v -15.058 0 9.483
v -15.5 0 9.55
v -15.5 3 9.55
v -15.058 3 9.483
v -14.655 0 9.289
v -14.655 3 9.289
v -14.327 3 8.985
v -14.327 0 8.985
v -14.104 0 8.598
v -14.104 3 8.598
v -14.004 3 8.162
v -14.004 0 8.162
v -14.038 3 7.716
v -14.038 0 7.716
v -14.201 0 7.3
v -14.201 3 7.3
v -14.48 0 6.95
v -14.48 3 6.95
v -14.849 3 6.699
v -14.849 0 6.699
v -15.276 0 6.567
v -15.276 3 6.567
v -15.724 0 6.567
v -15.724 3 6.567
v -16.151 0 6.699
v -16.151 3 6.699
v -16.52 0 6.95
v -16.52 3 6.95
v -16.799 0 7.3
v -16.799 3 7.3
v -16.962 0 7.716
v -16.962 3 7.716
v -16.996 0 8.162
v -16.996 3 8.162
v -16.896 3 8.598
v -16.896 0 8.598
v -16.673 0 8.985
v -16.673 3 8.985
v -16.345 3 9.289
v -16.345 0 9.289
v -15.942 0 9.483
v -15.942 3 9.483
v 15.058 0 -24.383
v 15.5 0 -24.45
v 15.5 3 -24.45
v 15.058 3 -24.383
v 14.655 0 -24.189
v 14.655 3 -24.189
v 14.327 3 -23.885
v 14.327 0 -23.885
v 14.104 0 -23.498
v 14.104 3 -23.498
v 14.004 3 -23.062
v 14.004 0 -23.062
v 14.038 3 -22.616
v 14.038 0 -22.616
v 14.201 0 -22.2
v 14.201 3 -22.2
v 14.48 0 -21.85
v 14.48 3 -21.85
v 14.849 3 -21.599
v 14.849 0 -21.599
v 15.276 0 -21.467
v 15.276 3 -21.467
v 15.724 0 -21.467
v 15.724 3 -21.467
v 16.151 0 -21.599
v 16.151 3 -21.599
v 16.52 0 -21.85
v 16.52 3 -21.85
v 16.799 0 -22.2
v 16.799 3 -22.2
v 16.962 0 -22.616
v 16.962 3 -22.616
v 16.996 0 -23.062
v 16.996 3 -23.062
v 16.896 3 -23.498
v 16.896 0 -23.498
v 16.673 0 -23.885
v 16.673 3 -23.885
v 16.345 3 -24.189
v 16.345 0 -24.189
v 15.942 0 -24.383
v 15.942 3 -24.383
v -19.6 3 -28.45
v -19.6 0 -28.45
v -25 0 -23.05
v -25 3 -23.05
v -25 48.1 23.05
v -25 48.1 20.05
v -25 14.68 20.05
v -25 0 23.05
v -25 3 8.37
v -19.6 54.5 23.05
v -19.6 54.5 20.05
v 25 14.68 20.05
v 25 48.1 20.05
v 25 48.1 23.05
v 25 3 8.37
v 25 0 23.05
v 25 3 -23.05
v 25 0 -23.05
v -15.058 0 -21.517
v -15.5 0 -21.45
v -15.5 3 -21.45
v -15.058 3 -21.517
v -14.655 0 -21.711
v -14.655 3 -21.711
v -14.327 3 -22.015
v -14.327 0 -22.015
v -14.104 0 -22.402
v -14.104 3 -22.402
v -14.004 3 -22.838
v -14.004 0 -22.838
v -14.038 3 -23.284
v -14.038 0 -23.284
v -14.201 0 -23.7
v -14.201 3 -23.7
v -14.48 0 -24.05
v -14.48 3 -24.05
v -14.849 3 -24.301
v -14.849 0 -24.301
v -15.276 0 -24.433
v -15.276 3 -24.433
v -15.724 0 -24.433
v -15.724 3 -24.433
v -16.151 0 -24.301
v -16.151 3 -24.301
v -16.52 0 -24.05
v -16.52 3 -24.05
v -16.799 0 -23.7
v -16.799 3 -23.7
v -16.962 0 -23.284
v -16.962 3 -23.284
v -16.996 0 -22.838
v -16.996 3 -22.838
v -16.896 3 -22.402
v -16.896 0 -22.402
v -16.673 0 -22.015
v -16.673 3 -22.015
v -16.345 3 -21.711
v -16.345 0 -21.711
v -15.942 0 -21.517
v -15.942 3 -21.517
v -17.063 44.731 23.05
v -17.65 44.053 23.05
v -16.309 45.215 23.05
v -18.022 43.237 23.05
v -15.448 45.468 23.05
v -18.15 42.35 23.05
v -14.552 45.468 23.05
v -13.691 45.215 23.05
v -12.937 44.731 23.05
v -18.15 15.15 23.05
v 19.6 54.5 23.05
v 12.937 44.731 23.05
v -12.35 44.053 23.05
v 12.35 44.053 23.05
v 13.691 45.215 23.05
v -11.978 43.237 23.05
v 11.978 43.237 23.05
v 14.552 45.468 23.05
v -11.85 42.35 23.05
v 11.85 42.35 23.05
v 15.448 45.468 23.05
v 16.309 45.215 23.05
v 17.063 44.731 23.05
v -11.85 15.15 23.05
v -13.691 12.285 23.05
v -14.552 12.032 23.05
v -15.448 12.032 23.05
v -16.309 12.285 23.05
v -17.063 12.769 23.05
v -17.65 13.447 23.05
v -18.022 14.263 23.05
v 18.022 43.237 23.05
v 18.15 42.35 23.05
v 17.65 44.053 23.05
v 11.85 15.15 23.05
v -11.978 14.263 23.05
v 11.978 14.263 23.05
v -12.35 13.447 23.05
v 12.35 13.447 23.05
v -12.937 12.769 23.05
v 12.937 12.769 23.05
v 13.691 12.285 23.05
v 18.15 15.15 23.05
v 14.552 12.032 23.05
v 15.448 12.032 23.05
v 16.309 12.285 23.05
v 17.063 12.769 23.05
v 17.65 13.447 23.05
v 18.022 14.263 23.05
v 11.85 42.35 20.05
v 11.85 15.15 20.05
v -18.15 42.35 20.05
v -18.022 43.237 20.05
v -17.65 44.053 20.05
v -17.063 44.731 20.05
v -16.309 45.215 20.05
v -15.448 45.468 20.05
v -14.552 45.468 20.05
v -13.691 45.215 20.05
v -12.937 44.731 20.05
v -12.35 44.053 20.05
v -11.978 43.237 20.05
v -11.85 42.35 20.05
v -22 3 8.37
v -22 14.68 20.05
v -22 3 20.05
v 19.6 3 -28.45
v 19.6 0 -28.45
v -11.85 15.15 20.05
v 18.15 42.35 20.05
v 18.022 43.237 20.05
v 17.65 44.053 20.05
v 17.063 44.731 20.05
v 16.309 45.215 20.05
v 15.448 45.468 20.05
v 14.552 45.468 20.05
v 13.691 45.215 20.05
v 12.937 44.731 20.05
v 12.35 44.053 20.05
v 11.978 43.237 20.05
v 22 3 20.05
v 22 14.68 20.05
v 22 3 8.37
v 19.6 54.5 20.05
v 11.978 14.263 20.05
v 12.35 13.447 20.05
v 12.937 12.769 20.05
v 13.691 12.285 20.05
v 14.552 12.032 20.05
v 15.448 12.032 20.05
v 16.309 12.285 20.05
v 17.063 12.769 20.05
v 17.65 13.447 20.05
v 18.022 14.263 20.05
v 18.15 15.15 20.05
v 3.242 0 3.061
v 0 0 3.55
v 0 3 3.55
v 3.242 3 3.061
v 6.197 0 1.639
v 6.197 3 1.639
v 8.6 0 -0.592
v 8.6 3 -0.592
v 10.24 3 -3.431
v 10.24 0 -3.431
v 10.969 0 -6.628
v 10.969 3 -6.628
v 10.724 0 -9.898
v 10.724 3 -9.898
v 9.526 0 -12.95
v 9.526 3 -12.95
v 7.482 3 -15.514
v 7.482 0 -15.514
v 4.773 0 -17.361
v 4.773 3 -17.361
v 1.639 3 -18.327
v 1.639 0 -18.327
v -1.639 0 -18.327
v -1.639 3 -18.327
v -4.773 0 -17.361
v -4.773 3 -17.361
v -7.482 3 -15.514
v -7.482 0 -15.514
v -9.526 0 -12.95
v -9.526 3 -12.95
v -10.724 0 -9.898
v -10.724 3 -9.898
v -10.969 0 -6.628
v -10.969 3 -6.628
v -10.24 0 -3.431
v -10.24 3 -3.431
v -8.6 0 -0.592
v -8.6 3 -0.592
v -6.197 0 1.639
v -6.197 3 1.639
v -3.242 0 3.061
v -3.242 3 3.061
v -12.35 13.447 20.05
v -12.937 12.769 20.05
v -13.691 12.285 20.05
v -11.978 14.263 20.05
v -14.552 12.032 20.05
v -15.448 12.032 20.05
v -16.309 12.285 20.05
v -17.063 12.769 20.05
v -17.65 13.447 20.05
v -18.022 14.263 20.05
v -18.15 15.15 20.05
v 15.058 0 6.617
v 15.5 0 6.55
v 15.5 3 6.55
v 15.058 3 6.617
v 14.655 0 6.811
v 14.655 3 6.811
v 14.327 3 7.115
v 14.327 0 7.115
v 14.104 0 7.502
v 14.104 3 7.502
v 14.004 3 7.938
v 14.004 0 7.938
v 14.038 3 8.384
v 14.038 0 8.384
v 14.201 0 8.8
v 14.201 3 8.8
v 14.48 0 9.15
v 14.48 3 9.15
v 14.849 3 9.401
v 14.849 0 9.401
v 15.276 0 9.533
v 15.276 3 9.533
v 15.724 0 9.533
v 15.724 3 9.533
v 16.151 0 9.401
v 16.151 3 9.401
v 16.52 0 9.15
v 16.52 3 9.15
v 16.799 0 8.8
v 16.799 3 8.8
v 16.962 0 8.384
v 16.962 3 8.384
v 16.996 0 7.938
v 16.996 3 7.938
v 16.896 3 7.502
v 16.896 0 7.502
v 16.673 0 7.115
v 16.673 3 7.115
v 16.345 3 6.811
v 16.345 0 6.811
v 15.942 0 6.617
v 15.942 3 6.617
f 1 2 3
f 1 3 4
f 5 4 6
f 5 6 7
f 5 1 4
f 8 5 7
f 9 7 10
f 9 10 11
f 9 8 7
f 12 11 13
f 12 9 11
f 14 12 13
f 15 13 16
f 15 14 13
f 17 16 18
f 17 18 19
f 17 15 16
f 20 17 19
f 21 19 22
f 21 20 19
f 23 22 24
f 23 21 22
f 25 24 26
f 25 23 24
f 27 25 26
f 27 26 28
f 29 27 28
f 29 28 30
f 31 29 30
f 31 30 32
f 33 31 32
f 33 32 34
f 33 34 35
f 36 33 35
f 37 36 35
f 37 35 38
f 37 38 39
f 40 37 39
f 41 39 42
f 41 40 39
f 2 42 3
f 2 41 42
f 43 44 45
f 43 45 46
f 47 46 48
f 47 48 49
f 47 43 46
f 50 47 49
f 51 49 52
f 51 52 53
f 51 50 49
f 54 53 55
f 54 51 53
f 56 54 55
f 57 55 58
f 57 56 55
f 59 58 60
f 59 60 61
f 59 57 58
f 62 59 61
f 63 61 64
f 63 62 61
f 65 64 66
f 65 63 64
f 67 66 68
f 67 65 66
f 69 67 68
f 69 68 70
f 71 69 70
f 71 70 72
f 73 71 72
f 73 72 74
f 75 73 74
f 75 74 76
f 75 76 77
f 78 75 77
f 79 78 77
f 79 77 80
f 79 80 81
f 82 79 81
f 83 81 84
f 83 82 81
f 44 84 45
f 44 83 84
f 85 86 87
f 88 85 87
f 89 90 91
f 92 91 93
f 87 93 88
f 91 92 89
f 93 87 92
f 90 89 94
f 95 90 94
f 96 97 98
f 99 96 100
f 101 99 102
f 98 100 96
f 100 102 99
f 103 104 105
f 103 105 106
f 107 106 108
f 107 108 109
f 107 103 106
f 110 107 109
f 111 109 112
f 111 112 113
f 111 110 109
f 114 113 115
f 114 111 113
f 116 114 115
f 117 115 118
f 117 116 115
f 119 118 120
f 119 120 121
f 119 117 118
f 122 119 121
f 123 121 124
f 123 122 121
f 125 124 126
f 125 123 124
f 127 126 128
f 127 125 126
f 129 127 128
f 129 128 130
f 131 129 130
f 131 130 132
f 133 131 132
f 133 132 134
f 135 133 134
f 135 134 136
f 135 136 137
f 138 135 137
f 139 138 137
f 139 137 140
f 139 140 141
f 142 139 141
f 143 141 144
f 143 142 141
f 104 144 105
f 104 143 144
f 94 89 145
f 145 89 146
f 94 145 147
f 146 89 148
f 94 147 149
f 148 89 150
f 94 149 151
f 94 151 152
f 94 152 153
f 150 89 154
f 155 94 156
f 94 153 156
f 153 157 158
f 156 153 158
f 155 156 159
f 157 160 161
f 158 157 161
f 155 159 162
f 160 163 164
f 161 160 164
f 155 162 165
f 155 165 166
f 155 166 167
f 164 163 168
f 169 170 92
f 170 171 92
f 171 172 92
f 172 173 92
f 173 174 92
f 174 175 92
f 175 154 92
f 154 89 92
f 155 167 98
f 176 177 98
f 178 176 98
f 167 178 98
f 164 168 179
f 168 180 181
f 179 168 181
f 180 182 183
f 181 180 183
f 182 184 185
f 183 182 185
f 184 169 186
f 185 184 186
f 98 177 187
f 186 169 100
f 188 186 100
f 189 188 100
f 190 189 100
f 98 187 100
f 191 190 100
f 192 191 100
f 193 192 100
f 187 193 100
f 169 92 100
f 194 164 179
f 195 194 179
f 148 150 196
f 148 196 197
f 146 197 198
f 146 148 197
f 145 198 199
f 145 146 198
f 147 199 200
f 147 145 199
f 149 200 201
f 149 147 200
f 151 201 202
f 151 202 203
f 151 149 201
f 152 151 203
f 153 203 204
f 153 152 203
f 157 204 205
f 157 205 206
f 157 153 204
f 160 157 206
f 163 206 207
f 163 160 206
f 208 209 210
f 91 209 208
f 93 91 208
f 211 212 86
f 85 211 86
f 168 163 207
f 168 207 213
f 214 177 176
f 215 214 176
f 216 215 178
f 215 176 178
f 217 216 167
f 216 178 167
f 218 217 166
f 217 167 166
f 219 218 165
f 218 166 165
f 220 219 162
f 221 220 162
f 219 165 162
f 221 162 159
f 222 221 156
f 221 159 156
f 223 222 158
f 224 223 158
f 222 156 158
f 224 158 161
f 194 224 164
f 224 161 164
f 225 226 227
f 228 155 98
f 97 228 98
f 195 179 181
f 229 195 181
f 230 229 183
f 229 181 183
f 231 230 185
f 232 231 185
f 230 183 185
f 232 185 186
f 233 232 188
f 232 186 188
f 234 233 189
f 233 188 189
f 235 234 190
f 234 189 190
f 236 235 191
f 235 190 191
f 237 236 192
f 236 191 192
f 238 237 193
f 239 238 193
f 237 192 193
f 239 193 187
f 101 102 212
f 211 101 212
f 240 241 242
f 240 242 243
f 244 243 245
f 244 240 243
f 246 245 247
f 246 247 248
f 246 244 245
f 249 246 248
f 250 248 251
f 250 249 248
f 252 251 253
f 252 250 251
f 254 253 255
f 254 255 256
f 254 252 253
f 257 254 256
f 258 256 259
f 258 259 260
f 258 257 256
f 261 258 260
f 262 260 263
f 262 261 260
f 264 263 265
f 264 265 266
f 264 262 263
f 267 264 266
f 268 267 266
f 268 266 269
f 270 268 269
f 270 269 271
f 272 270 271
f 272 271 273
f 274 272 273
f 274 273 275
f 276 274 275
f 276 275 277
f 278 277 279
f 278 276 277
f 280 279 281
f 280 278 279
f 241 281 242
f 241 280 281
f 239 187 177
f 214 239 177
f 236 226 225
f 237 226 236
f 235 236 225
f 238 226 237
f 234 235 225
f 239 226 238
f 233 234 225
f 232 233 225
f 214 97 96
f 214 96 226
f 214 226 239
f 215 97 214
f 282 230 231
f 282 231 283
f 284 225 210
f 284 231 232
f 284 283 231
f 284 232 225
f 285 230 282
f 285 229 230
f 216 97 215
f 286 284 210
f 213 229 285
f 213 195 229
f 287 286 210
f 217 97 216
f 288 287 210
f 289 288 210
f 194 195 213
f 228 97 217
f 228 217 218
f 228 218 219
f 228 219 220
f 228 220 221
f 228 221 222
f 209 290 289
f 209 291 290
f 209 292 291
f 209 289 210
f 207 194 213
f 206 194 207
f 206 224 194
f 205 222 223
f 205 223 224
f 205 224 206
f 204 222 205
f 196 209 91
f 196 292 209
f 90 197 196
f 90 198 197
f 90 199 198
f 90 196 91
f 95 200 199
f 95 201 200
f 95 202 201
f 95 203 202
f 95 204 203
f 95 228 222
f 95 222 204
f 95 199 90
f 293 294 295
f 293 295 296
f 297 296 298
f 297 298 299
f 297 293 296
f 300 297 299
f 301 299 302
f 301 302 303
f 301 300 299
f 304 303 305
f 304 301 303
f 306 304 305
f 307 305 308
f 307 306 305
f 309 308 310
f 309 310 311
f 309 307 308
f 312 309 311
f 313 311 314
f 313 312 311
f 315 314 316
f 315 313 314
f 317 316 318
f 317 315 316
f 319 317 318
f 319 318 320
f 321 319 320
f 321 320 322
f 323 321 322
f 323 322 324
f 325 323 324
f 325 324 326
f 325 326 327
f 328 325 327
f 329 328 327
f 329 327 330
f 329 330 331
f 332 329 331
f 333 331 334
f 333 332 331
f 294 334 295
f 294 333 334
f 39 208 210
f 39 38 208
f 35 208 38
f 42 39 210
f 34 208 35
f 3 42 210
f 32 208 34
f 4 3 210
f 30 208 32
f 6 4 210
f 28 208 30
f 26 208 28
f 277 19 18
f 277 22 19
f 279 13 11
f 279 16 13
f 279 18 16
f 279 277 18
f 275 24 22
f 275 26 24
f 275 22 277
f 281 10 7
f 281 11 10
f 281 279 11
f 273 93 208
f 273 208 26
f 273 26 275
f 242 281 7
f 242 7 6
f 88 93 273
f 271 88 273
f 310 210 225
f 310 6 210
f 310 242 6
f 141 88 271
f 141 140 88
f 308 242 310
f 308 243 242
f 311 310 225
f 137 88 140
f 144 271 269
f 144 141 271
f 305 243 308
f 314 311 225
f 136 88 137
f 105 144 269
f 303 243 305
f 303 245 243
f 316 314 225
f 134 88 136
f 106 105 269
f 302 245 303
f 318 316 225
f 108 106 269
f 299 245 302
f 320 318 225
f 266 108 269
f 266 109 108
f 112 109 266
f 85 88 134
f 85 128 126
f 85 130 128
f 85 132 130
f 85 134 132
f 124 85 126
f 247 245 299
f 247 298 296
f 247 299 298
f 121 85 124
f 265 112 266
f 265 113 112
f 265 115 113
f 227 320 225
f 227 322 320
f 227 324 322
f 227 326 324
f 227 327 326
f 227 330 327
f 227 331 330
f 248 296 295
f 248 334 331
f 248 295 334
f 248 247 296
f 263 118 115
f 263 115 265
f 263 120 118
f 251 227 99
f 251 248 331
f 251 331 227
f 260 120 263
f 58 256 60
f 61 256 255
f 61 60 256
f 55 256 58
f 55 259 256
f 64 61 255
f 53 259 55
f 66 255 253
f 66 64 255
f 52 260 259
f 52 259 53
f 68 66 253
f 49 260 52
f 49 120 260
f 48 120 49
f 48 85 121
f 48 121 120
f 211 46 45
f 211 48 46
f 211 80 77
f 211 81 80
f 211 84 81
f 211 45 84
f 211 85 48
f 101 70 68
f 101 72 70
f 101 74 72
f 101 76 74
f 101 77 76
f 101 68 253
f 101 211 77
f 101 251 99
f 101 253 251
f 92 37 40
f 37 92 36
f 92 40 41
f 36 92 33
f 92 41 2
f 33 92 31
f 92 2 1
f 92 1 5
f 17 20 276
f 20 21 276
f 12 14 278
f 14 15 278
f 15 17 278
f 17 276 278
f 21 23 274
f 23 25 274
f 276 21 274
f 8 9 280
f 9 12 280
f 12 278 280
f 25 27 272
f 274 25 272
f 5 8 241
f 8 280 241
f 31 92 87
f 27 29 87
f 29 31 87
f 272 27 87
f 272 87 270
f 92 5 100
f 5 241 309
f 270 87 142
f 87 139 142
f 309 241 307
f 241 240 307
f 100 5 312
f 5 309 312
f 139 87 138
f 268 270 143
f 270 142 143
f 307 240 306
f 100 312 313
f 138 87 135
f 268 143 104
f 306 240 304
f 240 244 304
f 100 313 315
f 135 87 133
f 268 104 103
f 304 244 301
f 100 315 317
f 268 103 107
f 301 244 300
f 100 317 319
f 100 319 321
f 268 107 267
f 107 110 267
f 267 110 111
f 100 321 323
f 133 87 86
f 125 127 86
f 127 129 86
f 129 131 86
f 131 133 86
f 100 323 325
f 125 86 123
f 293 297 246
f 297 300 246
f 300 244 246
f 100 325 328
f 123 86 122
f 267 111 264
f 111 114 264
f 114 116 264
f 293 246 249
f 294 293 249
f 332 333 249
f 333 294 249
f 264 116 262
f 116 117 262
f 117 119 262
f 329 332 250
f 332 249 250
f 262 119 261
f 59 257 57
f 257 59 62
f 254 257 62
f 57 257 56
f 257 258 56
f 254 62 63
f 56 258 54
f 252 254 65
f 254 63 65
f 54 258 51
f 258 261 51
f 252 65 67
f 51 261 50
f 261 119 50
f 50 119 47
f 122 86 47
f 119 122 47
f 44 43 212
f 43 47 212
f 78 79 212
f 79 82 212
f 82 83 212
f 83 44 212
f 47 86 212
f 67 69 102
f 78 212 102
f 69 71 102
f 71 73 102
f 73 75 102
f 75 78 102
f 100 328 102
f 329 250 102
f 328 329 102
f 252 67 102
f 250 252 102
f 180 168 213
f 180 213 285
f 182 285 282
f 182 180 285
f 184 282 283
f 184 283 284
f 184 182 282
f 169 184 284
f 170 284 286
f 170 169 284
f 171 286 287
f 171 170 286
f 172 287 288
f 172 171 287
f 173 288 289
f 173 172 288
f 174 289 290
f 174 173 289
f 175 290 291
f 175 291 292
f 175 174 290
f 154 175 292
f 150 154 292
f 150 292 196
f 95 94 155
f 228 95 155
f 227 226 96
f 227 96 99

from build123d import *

# Parameters (mm, degrees)
SKETCH_1_R      = 1.5
SKETCH_1_R_2    = 11
EXTRUDE_1_DEPTH = 3
EXTRUDE_2_DEPTH = 3
RIB_2_REACH     = 81.244
SKETCH_4_WALL_W = 177.006790998
SKETCH_4_WALL_H = 3


with BuildPart() as part:
    # 草图1 → 凸台-拉伸1 (new body)
    with BuildSketch(Plane(origin=(0, 0, 0), x_dir=(1, 0, 0), z_dir=(0, 1, 0))):
        Polygon((-25, -23.05), (25, -23.05), (25, 23.05), (19.6, 28.45), (-19.6, 28.45), (-25, 23.05), align=None)
        with Locations(Location((-15.5, 22.95, 0), (0, 0, 270))):
            Circle(SKETCH_1_R, mode=Mode.SUBTRACT)
        with Locations(Location((15.5, 22.95, 0), (0, 0, 90))):
            Circle(SKETCH_1_R, mode=Mode.SUBTRACT)
        with Locations(Location((-15.5, -8.05, 0), (0, 0, 270))):
            Circle(SKETCH_1_R, mode=Mode.SUBTRACT)
        with Locations(Location((15.5, -8.05, 0), (0, 0, 90))):
            Circle(SKETCH_1_R, mode=Mode.SUBTRACT)
        with Locations(Location((0, 7.45, 0), (0, 0, 270))):
            Circle(SKETCH_1_R_2, mode=Mode.SUBTRACT)
    extrude(amount=EXTRUDE_1_DEPTH)

    # 草图3 → 凸台-拉伸2 (add)
    with BuildSketch(Plane.XY.offset(23.05)):
        Polygon((25, 0), (-25, 0), (-25, 48.1), (-19.6, 54.5), (19.6, 54.5), (25, 48.1), align=None)
        with BuildLine():
            Line((-11.85, 42.35), (-11.85, 15.15))
            ThreePointArc((-11.85, 15.15), (-15, 12), (-18.15, 15.15))
            Line((-18.15, 15.15), (-18.15, 42.35))
            ThreePointArc((-18.15, 42.35), (-15, 45.5), (-11.85, 42.35))
        make_face(mode=Mode.SUBTRACT)
        with BuildLine():
            Line((11.85, 42.35), (11.85, 15.15))
            ThreePointArc((11.85, 15.15), (15, 12), (18.15, 15.15))
            Line((18.15, 15.15), (18.15, 42.35))
            ThreePointArc((18.15, 42.35), (15, 45.5), (11.85, 42.35))
        make_face(mode=Mode.SUBTRACT)
    extrude(amount=-EXTRUDE_2_DEPTH)

    # 草图4 wall → 筋2 (add, up to next)
    with BuildSketch(Plane(origin=(-25, 8.840091802, 14.209908198), x_dir=(0, -0.707106781187, -0.707106781187), z_dir=(0, -0.707106781187, 0.707106781187)), mode=Mode.PRIVATE) as rib_2_sk1:
        with Locations((0, 1.5)):
            Rectangle(SKETCH_4_WALL_W, SKETCH_4_WALL_H)
    rib_2_tool1 = extrude(rib_2_sk1.sketch, amount=RIB_2_REACH, mode=Mode.PRIVATE) - part.part
    rib_2 = rib_2_tool1.solids().sort_by_distance((-25, 8.840091802, 14.209908198))[0]
    add(rib_2)

    # 镜向1: 筋2 across plane
    add(rib_2.mirror(Plane(origin=(0, 0, 0), x_dir=(0, 0, 1), z_dir=(1, 0, 0))))


solid = part.part
